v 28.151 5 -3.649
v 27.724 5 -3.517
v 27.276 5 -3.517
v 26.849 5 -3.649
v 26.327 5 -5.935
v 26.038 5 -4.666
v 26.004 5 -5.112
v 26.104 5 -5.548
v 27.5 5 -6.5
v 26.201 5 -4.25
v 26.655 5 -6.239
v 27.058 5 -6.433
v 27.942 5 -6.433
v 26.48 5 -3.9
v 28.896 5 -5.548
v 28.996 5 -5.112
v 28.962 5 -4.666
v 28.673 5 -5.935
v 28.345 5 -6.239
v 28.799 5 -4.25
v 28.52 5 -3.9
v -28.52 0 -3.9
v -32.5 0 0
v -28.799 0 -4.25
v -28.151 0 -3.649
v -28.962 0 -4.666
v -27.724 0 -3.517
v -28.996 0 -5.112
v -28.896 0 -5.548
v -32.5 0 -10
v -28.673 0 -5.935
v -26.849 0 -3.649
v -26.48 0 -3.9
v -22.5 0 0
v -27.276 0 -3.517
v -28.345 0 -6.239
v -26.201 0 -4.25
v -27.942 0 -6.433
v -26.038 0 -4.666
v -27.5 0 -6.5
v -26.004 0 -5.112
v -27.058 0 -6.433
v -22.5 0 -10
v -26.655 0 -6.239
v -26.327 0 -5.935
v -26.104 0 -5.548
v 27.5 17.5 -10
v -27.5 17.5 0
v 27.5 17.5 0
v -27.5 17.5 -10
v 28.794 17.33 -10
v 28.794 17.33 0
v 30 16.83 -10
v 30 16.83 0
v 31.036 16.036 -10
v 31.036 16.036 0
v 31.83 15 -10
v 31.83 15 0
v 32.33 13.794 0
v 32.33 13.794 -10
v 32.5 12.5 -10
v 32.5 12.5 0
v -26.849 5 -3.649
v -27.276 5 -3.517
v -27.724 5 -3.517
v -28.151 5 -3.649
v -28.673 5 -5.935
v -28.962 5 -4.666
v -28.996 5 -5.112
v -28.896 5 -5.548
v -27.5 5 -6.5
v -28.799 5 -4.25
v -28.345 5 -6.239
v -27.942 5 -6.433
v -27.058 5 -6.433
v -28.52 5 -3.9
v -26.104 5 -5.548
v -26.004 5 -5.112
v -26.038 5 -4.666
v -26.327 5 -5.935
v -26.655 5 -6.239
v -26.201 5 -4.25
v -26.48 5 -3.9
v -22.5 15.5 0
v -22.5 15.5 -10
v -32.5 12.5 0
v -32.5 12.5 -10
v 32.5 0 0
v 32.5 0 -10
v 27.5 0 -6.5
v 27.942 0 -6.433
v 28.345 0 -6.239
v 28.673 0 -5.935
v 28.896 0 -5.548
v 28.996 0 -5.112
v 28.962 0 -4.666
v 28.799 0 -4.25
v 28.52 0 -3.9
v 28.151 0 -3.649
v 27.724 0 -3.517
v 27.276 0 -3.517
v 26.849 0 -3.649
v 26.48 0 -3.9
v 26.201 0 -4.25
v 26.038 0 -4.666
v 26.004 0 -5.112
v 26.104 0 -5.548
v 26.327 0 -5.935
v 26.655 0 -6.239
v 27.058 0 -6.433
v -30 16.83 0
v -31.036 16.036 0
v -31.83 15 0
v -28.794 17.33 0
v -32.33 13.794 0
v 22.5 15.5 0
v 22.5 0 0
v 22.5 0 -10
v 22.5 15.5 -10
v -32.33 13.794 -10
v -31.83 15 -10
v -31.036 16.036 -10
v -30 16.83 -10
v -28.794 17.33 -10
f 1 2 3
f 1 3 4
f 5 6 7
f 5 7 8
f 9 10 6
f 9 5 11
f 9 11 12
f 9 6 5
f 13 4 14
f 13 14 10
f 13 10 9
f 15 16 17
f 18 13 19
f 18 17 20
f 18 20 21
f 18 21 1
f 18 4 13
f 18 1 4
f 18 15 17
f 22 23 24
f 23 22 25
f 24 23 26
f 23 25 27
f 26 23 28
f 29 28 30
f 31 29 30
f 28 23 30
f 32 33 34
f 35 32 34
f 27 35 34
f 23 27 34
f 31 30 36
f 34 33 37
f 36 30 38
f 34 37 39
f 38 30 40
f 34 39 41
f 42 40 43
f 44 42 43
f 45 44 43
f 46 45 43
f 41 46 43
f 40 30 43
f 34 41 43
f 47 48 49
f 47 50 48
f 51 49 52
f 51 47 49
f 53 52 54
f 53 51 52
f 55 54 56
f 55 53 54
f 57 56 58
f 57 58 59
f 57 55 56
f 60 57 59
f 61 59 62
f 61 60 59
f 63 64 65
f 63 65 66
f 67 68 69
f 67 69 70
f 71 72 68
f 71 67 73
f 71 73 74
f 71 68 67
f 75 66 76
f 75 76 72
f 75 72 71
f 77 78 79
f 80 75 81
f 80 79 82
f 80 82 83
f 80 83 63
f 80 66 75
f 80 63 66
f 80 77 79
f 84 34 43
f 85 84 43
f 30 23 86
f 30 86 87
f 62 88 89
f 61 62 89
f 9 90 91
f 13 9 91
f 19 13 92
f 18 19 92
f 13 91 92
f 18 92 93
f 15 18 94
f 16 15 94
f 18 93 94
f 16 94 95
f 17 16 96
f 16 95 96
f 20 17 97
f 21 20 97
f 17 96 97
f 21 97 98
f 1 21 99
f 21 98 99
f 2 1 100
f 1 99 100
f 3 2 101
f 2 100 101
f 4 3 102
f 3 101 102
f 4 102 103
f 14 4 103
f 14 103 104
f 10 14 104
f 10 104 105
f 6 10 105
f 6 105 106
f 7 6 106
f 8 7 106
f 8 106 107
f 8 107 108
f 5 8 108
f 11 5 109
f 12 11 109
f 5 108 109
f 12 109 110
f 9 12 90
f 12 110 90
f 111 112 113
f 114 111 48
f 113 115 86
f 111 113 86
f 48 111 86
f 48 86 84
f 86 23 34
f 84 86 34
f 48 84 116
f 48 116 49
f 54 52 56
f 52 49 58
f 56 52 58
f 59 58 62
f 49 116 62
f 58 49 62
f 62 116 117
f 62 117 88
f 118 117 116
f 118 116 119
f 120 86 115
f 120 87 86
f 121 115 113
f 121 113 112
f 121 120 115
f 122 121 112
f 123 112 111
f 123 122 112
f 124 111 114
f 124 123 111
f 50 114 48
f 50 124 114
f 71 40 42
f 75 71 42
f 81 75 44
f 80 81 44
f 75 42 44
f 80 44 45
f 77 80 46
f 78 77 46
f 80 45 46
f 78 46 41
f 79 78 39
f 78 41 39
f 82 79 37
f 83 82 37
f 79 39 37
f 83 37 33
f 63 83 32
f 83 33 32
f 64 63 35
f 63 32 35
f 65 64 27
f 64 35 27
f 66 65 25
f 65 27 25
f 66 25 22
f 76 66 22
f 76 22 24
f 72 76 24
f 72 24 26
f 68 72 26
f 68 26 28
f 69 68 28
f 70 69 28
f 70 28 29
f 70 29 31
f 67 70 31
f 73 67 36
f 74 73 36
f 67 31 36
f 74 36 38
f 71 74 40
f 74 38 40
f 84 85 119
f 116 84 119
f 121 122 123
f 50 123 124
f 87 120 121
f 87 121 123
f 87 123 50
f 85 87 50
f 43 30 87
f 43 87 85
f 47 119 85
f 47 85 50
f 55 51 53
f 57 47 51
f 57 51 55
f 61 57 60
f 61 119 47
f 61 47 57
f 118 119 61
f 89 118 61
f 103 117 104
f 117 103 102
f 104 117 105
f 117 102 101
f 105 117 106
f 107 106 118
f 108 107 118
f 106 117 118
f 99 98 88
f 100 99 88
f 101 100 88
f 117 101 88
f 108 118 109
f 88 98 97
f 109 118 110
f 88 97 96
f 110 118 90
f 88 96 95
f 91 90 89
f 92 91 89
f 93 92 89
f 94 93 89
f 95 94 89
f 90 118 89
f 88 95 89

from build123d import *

# Parameters (mm, degrees)
CROQUIS1_W                = 10
CROQUIS1_H                = 10
SALIENTE_EXTRUIR1_DEPTH   = 15.5
SALIENTE_EXTRUIR1_2_DEPTH = 15.5
CROQUIS5_W                = 65
CROQUIS5_H                = 10
SALIENTE_EXTRUIR4_DEPTH   = 2
CROQUIS6_R                = 1.5
CORTAR_EXTRUIR2_DEPTH     = 5
REDONDEO1_R               = 5


with BuildPart() as part:
    # Croquis1 → Saliente-Extruir1 (new body)
    with BuildSketch(Plane(origin=(0, 0, 0), x_dir=(1, 0, 0), z_dir=(0, 1, 0))):
        with Locations((-27.5, 5)):
            Rectangle(CROQUIS1_W, CROQUIS1_H)
    extrude(amount=SALIENTE_EXTRUIR1_DEPTH)



with BuildPart() as body_2:
    # Croquis1 → Saliente-Extruir1 2 (new body)
    with BuildSketch(Plane(origin=(0, 0, 0), x_dir=(1, 0, 0), z_dir=(0, 1, 0))):
        with Locations((27.5, 5)):
            Rectangle(CROQUIS1_W, CROQUIS1_H)
    extrude(amount=SALIENTE_EXTRUIR1_2_DEPTH)


with BuildPart() as part_1:
    add(part.part)

    add(body_2.part)  # Saliente-Extruir4 merges body 2
    # Croquis5 → Saliente-Extruir4 (add)
    with BuildSketch(Plane(origin=(0, 15.5, 0), x_dir=(1, 0, 0), z_dir=(0, 1, 0))):
        with Locations((0, 5)):
            Rectangle(CROQUIS5_W, CROQUIS5_H)
    extrude(amount=SALIENTE_EXTRUIR4_DEPTH)

    # Croquis6 → Cortar-Extruir2 (cut)
    with BuildSketch(Plane.XZ):
        with Locations(Location((-27.5, -5, 0), (0, 0, 270))):
            Circle(CROQUIS6_R)
        with Locations(Location((27.5, -5, 0), (0, 0, 270))):
            Circle(CROQUIS6_R)
    extrude(amount=-CORTAR_EXTRUIR2_DEPTH, mode=Mode.SUBTRACT)

    # Redondeo1
    redondeo1_edges = [part_1.edges().sort_by_distance(p)[0] for p in [
        (-32.5, 17.5, -5),
        (32.5, 17.5, -5),
    ]]
    fillet(redondeo1_edges, radius=REDONDEO1_R)


solid = part_1.part
